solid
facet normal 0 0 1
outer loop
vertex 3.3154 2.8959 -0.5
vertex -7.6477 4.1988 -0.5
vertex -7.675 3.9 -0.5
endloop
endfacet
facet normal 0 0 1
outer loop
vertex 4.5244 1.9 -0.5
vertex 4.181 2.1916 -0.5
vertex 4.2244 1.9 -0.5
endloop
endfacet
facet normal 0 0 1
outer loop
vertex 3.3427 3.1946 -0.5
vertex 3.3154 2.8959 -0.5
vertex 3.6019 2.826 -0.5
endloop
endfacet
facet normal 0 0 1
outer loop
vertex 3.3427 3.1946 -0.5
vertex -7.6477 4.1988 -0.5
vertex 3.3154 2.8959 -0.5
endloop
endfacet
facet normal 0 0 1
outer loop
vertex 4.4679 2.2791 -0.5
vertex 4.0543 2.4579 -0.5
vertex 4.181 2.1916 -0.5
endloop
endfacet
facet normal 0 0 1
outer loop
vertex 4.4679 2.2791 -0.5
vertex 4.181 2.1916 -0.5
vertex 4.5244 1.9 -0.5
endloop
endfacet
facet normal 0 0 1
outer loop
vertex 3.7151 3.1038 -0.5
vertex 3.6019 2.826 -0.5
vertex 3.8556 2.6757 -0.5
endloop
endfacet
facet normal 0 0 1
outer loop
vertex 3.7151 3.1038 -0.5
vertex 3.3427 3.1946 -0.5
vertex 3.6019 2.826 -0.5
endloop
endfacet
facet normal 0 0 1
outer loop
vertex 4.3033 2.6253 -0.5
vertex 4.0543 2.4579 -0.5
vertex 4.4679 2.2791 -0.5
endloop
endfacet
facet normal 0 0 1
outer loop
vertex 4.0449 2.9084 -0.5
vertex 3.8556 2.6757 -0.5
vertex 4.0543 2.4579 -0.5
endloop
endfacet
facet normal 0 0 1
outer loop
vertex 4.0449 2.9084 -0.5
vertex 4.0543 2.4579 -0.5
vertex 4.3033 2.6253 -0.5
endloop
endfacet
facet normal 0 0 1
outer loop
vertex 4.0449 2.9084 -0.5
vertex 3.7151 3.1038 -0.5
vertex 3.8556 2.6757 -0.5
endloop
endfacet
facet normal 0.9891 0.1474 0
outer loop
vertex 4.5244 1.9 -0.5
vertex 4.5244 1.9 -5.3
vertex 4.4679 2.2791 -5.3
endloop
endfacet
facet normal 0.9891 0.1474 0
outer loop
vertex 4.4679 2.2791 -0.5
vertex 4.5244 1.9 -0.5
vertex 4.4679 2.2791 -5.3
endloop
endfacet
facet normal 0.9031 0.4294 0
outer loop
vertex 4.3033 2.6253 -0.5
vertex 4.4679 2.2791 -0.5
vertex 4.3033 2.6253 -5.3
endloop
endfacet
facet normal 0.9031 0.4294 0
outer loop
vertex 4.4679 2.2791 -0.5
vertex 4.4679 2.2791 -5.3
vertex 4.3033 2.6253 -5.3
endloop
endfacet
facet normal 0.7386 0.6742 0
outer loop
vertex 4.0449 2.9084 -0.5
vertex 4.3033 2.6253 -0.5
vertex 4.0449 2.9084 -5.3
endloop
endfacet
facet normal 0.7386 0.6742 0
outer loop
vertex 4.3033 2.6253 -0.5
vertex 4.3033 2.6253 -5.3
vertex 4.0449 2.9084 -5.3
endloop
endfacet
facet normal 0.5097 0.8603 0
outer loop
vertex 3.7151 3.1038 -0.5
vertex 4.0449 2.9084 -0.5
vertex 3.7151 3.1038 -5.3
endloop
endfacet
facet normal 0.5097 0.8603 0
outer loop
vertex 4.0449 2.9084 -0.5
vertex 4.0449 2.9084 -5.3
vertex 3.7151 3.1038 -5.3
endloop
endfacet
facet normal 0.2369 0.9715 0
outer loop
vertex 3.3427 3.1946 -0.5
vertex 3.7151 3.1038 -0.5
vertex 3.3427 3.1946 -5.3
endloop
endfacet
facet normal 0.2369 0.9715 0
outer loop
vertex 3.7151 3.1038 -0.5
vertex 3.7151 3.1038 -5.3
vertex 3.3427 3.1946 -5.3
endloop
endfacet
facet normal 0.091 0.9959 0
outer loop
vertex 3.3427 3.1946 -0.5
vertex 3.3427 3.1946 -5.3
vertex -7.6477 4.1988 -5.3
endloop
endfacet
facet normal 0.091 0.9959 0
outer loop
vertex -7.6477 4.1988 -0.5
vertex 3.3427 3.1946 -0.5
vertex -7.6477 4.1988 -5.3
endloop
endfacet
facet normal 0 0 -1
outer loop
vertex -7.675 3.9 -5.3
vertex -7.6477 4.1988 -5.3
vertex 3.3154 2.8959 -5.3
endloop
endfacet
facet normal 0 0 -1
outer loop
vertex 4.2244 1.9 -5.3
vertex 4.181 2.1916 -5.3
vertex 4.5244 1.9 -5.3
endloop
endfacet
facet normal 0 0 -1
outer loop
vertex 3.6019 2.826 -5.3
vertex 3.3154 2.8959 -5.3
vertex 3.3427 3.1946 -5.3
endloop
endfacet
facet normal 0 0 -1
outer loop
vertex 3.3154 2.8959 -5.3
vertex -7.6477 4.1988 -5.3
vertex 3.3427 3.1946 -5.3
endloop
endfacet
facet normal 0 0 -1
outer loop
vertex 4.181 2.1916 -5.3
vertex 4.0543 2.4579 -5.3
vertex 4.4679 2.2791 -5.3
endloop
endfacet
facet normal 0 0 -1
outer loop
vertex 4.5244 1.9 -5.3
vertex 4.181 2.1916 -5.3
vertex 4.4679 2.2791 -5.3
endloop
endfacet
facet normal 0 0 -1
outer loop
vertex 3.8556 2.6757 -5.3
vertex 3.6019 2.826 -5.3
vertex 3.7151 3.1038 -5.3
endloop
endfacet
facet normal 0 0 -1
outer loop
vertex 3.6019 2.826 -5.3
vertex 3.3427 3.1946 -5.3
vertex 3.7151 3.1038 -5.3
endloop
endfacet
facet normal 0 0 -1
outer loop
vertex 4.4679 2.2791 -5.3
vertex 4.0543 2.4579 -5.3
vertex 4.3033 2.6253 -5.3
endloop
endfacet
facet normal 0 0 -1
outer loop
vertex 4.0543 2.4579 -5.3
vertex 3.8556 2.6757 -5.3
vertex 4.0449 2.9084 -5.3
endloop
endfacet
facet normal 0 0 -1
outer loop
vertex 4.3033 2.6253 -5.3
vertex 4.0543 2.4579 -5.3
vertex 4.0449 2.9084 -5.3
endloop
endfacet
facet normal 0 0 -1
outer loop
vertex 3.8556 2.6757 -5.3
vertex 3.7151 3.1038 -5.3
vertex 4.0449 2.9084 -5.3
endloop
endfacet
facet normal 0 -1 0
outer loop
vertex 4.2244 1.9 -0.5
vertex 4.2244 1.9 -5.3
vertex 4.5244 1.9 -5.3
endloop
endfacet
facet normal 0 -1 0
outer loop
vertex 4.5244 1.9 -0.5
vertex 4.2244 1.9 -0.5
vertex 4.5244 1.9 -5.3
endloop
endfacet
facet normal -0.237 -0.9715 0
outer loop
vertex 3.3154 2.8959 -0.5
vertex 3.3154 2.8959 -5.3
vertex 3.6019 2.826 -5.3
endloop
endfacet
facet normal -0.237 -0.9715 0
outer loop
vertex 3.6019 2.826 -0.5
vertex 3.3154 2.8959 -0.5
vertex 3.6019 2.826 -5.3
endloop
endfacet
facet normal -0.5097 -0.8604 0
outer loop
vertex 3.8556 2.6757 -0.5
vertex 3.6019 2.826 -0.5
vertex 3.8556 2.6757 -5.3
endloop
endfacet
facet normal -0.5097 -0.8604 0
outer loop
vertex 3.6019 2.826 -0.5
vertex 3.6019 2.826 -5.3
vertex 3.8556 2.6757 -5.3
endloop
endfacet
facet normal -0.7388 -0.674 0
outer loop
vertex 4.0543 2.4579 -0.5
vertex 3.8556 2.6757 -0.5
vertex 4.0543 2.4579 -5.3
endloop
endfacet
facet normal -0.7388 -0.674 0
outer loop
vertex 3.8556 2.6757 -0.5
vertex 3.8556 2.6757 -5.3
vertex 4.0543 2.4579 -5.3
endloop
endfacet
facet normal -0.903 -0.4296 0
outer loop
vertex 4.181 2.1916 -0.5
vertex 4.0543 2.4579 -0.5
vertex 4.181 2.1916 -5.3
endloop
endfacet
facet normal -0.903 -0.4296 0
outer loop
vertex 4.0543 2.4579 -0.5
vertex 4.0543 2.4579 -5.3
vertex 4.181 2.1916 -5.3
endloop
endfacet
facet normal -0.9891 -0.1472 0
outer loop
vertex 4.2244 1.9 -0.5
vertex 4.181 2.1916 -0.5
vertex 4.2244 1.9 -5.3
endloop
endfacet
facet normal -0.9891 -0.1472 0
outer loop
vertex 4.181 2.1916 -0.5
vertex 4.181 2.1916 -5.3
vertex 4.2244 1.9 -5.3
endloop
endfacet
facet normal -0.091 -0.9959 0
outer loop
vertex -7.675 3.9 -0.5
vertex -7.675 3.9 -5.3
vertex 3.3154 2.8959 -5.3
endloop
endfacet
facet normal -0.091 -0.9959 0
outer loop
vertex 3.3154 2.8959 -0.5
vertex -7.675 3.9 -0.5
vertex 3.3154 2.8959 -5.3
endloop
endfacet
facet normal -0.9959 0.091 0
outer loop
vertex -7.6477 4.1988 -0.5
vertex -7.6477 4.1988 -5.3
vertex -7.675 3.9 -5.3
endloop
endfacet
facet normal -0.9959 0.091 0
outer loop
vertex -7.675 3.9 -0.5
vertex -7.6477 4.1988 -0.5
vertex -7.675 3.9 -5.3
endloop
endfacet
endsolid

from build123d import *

# Parameters (mm, degrees)
BASE_FLANGE1_DEPTH      = 2.4
BASE_FLANGE1_DEPTH_BACK = 2.4


# Sheet-metal steps are written as plain solids
with BuildPart() as part:
    # Sketch2 → Base-Flange1 (new, two sides: drawn at the far end of the back side and taken through both)
    with BuildSketch(Plane.XY.offset(-2.9).offset(-BASE_FLANGE1_DEPTH_BACK)):
        with BuildLine():
            Line((-7.675, 3.9), (3.315435248, 2.895852113))
            ThreePointArc((3.315435248, 2.895852113), (3.963023803, 2.574171105), (4.224448606, 1.9))
            Line((4.224448606, 1.9), (4.524448606, 1.9))
            ThreePointArc((4.524448606, 1.9), (4.184596362, 2.776422437), (3.342731241, 3.194607747))
            Line((3.342731241, 3.194607747), (-7.647704007, 4.198755634))
            Line((-7.647704007, 4.198755634), (-7.675, 3.9))
        make_face()
    extrude(amount=BASE_FLANGE1_DEPTH + BASE_FLANGE1_DEPTH_BACK)


solid = part.part
